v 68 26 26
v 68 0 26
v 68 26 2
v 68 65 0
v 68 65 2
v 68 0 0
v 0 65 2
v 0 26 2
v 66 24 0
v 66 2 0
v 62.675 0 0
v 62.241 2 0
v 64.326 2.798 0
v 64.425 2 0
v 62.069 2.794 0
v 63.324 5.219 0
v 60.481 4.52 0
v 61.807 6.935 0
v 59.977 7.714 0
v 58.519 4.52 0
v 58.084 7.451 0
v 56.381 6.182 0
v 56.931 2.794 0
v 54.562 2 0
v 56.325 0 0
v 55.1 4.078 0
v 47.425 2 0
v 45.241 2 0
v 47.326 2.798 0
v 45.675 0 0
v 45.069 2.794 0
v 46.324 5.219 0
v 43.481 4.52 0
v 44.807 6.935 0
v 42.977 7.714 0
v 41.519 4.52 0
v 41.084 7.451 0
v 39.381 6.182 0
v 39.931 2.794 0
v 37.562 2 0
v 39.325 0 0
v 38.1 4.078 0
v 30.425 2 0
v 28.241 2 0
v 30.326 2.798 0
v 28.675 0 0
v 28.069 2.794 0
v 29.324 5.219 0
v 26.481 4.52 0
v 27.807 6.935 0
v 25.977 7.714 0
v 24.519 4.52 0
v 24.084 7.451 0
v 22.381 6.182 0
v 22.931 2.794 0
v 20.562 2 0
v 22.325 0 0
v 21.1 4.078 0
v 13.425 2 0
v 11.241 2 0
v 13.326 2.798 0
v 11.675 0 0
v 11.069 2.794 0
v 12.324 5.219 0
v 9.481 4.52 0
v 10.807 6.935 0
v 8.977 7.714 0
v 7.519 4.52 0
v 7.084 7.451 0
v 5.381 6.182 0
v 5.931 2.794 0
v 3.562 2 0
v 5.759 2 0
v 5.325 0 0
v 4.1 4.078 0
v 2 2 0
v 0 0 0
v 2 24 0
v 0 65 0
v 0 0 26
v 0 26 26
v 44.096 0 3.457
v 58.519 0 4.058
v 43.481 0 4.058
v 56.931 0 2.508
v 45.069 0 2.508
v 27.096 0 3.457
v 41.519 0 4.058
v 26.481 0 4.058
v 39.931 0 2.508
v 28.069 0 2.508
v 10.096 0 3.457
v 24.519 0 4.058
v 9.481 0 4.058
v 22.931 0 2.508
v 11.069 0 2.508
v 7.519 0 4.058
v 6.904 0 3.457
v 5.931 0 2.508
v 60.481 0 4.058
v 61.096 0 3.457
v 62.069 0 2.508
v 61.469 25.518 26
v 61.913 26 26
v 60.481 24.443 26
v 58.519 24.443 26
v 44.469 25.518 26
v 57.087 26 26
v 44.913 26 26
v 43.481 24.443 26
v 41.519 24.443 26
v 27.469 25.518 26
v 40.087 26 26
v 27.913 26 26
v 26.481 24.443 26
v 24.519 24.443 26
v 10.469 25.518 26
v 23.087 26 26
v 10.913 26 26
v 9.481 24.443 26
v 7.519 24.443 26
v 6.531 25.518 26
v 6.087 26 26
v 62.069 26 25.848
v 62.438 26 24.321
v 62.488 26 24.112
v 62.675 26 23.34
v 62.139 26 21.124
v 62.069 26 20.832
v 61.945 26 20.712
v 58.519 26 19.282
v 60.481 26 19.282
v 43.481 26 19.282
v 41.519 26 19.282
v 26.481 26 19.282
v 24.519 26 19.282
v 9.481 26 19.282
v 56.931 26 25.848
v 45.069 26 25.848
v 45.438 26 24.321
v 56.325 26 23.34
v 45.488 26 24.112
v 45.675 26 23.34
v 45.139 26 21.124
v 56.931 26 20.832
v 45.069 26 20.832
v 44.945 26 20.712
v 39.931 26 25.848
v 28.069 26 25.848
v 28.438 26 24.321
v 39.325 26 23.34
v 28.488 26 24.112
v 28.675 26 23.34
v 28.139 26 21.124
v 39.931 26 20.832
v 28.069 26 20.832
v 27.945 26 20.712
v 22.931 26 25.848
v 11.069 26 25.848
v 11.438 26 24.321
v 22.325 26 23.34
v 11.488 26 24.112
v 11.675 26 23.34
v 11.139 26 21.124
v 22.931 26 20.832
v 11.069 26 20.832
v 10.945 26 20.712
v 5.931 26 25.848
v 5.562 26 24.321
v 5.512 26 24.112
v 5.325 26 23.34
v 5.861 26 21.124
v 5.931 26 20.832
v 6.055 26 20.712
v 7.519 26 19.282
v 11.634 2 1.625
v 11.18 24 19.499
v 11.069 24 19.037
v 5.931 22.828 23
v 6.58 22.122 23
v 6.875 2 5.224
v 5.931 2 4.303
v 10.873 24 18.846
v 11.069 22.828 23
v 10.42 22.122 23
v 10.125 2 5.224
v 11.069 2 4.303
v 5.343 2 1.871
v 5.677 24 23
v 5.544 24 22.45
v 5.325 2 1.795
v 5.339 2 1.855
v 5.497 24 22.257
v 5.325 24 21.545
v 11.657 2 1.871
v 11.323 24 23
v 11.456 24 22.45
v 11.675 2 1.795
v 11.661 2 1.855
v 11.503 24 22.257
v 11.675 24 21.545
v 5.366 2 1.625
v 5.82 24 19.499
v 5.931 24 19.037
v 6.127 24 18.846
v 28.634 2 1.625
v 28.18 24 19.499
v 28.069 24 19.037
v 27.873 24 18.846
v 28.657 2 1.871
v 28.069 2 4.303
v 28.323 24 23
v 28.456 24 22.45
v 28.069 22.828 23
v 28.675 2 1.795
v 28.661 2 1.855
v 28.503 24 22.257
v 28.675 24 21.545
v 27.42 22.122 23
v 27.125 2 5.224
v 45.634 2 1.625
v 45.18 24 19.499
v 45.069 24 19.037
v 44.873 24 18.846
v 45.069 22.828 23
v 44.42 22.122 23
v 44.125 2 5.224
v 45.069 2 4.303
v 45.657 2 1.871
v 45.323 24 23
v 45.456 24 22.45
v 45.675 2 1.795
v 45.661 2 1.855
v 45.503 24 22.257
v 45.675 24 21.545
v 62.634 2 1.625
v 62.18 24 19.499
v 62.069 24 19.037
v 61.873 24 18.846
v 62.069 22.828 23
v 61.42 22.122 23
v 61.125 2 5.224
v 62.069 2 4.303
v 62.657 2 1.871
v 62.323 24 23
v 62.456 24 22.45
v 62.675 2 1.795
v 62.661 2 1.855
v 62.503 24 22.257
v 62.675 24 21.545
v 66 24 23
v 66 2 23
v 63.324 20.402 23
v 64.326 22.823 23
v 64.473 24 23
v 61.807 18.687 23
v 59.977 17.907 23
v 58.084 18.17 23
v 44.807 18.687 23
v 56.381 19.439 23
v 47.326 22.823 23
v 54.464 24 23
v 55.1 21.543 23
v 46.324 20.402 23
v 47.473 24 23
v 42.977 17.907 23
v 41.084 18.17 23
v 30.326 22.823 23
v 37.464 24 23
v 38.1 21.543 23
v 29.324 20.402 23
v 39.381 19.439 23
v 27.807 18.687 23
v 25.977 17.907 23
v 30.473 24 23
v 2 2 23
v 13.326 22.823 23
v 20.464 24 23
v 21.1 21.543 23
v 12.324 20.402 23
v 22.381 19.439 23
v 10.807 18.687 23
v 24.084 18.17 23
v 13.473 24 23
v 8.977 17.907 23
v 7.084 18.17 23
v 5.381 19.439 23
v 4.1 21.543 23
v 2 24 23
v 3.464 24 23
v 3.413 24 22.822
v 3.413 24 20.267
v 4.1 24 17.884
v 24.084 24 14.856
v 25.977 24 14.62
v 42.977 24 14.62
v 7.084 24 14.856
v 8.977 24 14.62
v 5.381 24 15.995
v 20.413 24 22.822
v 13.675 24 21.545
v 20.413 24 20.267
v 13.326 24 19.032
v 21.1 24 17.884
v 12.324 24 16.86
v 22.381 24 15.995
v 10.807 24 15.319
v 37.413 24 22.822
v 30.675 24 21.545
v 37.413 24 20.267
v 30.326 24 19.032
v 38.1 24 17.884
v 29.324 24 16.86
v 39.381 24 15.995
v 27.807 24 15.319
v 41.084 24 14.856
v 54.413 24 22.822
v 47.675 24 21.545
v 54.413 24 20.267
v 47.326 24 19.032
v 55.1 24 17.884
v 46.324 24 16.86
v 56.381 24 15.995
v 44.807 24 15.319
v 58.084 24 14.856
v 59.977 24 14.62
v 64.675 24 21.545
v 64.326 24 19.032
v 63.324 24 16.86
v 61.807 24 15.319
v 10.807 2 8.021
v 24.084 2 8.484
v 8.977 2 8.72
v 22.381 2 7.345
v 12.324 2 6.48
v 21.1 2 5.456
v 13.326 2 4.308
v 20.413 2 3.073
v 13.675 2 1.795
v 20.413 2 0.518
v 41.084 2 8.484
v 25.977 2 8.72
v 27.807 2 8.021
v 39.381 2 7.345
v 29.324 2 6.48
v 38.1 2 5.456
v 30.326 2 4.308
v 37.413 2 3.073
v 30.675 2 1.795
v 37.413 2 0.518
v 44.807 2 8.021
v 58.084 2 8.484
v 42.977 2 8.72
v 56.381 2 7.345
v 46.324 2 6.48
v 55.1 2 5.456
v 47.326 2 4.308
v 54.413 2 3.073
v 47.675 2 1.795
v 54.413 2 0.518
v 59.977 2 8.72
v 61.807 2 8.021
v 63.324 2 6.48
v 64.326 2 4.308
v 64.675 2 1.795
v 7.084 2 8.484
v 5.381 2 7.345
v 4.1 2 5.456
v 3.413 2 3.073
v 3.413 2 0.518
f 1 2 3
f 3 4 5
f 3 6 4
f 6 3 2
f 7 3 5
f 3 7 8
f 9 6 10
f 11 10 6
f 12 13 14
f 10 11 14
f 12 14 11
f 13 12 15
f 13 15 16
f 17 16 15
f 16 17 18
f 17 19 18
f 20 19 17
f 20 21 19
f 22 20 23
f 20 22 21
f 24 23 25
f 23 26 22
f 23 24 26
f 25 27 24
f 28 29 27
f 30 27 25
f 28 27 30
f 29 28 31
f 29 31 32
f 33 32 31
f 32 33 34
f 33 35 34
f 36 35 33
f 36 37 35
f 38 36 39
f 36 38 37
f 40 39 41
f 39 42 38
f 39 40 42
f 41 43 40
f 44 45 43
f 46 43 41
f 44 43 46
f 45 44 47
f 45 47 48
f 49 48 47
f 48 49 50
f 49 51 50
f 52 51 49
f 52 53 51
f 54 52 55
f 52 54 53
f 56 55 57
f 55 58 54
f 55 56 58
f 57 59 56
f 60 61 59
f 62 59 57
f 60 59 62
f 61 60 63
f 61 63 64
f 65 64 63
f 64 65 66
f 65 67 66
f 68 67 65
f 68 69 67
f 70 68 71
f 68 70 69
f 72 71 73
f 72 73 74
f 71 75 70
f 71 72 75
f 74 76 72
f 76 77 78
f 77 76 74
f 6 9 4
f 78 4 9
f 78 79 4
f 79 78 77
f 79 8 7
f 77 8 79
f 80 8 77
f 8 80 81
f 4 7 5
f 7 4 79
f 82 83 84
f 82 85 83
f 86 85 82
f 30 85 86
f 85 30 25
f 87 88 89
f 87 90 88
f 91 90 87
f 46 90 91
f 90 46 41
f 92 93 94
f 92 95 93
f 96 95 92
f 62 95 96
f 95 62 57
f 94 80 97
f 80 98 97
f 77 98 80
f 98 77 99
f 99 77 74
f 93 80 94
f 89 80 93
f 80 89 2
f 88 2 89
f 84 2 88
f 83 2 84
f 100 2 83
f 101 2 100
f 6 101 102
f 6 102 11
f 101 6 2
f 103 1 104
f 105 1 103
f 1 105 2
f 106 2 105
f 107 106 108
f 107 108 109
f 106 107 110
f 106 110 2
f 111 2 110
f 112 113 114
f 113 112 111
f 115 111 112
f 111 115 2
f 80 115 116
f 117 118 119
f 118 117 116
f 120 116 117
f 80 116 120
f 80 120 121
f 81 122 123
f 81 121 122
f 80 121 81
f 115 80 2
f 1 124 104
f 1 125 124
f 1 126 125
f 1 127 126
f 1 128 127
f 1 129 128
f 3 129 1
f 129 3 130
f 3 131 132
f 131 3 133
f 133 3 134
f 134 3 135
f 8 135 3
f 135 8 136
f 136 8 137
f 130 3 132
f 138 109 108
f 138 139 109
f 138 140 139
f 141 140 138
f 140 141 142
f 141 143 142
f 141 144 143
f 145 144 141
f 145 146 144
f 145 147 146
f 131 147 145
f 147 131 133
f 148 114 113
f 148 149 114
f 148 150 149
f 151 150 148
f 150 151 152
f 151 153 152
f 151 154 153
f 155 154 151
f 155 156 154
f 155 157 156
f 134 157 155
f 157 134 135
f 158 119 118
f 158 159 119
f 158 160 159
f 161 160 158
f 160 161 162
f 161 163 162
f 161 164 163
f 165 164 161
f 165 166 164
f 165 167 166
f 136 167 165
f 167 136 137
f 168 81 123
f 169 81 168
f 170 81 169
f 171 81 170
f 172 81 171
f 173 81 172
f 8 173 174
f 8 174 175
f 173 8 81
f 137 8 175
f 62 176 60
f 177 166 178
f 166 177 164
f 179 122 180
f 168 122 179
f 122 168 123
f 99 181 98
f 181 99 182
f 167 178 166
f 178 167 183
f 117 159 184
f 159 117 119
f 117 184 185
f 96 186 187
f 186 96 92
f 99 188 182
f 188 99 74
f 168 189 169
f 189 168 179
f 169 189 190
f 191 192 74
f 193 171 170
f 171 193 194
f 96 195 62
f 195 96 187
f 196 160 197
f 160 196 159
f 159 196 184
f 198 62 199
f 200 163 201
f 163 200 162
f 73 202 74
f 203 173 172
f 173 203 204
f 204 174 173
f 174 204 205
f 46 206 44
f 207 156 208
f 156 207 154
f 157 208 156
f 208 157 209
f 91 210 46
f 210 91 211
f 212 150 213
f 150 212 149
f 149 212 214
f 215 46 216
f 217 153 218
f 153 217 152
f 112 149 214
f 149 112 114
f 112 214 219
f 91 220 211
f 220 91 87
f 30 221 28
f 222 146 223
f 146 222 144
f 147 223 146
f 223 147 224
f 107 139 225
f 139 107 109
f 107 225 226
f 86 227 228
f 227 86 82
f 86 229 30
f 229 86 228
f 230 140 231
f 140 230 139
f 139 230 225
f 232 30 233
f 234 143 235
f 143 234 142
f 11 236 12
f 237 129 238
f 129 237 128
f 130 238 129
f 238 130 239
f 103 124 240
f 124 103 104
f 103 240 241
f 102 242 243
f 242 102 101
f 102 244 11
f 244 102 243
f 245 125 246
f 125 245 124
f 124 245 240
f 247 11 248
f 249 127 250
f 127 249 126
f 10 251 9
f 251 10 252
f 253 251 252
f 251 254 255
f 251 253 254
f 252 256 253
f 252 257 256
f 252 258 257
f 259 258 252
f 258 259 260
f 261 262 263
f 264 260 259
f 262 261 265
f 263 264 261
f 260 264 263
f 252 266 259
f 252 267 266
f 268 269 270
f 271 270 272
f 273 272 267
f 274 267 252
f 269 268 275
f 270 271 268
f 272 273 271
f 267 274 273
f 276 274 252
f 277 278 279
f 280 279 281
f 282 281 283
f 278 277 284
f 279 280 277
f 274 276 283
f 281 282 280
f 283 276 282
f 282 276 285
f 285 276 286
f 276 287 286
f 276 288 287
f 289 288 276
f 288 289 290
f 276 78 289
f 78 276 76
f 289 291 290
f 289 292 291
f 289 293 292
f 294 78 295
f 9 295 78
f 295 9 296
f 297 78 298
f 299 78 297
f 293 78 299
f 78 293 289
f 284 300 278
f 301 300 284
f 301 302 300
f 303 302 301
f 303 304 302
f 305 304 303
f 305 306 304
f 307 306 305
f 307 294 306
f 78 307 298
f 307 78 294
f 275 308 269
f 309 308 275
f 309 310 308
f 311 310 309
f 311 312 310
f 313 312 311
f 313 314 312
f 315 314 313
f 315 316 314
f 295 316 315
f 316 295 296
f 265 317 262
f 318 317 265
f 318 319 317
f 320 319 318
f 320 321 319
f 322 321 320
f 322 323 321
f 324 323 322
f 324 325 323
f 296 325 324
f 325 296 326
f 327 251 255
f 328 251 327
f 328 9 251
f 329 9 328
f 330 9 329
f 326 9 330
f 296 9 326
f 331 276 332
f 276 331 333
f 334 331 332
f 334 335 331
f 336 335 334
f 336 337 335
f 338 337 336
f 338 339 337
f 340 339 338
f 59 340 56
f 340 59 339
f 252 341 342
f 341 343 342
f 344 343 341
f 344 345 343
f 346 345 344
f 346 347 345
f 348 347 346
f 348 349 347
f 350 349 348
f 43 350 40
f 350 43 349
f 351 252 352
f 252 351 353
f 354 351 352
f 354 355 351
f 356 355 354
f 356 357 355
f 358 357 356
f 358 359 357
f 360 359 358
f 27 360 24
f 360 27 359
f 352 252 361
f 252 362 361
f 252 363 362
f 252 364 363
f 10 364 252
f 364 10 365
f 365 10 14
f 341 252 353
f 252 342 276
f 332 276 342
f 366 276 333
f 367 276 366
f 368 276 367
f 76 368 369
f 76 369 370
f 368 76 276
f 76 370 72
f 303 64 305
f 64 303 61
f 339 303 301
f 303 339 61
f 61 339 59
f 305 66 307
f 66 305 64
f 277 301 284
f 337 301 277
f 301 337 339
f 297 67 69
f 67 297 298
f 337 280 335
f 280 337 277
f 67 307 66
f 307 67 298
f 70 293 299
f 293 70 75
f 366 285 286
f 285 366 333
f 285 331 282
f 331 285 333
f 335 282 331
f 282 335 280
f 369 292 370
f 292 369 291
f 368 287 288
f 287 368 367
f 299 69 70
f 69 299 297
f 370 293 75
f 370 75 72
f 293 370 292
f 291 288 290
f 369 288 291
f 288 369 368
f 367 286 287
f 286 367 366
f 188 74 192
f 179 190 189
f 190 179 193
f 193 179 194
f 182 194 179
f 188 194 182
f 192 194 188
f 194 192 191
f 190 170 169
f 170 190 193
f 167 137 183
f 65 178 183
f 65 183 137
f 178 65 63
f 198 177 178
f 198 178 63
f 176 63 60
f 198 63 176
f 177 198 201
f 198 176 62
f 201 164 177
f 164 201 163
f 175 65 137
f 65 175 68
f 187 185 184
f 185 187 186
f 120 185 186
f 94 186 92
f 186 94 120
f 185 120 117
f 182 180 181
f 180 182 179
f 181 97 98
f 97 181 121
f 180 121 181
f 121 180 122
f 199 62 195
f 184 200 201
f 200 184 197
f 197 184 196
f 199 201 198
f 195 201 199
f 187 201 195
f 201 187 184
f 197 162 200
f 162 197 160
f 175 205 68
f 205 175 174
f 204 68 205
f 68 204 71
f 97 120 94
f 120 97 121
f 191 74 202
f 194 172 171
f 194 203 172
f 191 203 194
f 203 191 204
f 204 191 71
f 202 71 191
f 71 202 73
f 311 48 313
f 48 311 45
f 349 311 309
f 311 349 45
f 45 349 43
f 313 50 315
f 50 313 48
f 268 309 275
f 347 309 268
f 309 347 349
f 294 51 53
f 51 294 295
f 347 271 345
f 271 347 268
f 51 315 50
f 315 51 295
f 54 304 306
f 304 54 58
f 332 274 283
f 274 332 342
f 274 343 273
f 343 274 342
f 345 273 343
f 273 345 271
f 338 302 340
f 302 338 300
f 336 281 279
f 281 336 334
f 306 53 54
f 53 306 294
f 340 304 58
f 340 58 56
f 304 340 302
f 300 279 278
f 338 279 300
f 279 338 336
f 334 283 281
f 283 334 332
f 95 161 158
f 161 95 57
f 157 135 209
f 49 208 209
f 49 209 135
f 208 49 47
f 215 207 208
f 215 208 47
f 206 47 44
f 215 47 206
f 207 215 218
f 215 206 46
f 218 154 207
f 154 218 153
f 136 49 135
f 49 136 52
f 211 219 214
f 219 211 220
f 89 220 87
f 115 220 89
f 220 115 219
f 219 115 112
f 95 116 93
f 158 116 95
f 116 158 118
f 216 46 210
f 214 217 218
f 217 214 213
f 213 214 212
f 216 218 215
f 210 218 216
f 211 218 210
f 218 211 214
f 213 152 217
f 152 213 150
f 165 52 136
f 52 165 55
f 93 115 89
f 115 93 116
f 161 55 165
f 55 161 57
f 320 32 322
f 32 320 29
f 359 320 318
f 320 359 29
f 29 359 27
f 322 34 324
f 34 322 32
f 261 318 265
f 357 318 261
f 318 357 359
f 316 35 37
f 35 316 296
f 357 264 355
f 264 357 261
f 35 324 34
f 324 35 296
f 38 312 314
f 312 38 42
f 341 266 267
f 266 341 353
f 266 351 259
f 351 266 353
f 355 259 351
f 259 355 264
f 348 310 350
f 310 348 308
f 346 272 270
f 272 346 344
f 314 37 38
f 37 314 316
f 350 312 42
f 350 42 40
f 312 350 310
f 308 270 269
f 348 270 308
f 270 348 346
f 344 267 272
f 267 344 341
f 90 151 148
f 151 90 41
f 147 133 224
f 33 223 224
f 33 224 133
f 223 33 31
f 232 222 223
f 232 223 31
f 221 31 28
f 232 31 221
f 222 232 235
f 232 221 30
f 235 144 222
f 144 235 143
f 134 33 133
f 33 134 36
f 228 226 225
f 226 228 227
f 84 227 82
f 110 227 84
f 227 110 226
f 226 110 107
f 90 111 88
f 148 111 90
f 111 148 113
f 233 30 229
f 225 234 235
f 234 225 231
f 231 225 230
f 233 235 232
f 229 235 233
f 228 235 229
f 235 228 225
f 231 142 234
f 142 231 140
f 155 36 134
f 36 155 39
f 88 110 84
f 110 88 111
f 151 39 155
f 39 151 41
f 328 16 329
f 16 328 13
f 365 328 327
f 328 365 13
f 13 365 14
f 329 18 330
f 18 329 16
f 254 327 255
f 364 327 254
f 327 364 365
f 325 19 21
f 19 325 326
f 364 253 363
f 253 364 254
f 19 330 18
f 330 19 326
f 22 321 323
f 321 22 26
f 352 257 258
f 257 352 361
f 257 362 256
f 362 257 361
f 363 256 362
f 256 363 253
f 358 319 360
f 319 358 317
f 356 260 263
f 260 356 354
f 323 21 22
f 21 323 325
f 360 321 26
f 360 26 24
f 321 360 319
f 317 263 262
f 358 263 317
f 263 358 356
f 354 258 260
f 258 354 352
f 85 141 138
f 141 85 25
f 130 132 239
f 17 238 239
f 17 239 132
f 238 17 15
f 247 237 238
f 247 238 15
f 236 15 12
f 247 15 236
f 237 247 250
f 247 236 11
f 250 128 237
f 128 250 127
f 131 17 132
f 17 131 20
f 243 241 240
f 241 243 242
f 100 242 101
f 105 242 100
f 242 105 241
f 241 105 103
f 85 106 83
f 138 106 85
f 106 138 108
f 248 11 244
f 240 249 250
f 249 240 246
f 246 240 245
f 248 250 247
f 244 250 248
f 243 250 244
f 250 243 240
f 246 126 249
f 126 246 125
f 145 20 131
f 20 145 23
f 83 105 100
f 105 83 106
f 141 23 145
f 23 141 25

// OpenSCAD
in_to_mm = 25.4;
width = 68;
height = 65;
depth = 52;
back_thickness = 2;
block = depth/2;
hole_size = (1/4) * in_to_mm;
wall_thickness = 2;
holes = 4;
hole_spacing = width / holes;
slope = -atan(height / (depth + hole_size));

difference(){
union(){
cube([width,height,back_thickness]);
cube([width,block,block]);
}
translate([wall_thickness,wall_thickness,-1]){
cube([width - 2*wall_thickness, block - 2*wall_thickness, block - wall_thickness]);
}
translate([hole_spacing / 2,0,0]){
for (h = [0: holes - 1]){ 
translate([h * hole_spacing,0,0]){
rotate([slope,0,0]){
cylinder(d = hole_size, h = 101);
}
}
}
}
}
intersection(){
cube([width,block,block]);
translate([hole_spacing / 2,0,0]){
for (h = [0: holes - 1]){ 
translate([h * hole_spacing,0,0]){
rotate([slope,0,0]){
difference(){
cylinder(d = hole_size + 2* wall_thickness, h = 100);    
cylinder(d = hole_size, h = 101);
}
}
}
}
}
}
